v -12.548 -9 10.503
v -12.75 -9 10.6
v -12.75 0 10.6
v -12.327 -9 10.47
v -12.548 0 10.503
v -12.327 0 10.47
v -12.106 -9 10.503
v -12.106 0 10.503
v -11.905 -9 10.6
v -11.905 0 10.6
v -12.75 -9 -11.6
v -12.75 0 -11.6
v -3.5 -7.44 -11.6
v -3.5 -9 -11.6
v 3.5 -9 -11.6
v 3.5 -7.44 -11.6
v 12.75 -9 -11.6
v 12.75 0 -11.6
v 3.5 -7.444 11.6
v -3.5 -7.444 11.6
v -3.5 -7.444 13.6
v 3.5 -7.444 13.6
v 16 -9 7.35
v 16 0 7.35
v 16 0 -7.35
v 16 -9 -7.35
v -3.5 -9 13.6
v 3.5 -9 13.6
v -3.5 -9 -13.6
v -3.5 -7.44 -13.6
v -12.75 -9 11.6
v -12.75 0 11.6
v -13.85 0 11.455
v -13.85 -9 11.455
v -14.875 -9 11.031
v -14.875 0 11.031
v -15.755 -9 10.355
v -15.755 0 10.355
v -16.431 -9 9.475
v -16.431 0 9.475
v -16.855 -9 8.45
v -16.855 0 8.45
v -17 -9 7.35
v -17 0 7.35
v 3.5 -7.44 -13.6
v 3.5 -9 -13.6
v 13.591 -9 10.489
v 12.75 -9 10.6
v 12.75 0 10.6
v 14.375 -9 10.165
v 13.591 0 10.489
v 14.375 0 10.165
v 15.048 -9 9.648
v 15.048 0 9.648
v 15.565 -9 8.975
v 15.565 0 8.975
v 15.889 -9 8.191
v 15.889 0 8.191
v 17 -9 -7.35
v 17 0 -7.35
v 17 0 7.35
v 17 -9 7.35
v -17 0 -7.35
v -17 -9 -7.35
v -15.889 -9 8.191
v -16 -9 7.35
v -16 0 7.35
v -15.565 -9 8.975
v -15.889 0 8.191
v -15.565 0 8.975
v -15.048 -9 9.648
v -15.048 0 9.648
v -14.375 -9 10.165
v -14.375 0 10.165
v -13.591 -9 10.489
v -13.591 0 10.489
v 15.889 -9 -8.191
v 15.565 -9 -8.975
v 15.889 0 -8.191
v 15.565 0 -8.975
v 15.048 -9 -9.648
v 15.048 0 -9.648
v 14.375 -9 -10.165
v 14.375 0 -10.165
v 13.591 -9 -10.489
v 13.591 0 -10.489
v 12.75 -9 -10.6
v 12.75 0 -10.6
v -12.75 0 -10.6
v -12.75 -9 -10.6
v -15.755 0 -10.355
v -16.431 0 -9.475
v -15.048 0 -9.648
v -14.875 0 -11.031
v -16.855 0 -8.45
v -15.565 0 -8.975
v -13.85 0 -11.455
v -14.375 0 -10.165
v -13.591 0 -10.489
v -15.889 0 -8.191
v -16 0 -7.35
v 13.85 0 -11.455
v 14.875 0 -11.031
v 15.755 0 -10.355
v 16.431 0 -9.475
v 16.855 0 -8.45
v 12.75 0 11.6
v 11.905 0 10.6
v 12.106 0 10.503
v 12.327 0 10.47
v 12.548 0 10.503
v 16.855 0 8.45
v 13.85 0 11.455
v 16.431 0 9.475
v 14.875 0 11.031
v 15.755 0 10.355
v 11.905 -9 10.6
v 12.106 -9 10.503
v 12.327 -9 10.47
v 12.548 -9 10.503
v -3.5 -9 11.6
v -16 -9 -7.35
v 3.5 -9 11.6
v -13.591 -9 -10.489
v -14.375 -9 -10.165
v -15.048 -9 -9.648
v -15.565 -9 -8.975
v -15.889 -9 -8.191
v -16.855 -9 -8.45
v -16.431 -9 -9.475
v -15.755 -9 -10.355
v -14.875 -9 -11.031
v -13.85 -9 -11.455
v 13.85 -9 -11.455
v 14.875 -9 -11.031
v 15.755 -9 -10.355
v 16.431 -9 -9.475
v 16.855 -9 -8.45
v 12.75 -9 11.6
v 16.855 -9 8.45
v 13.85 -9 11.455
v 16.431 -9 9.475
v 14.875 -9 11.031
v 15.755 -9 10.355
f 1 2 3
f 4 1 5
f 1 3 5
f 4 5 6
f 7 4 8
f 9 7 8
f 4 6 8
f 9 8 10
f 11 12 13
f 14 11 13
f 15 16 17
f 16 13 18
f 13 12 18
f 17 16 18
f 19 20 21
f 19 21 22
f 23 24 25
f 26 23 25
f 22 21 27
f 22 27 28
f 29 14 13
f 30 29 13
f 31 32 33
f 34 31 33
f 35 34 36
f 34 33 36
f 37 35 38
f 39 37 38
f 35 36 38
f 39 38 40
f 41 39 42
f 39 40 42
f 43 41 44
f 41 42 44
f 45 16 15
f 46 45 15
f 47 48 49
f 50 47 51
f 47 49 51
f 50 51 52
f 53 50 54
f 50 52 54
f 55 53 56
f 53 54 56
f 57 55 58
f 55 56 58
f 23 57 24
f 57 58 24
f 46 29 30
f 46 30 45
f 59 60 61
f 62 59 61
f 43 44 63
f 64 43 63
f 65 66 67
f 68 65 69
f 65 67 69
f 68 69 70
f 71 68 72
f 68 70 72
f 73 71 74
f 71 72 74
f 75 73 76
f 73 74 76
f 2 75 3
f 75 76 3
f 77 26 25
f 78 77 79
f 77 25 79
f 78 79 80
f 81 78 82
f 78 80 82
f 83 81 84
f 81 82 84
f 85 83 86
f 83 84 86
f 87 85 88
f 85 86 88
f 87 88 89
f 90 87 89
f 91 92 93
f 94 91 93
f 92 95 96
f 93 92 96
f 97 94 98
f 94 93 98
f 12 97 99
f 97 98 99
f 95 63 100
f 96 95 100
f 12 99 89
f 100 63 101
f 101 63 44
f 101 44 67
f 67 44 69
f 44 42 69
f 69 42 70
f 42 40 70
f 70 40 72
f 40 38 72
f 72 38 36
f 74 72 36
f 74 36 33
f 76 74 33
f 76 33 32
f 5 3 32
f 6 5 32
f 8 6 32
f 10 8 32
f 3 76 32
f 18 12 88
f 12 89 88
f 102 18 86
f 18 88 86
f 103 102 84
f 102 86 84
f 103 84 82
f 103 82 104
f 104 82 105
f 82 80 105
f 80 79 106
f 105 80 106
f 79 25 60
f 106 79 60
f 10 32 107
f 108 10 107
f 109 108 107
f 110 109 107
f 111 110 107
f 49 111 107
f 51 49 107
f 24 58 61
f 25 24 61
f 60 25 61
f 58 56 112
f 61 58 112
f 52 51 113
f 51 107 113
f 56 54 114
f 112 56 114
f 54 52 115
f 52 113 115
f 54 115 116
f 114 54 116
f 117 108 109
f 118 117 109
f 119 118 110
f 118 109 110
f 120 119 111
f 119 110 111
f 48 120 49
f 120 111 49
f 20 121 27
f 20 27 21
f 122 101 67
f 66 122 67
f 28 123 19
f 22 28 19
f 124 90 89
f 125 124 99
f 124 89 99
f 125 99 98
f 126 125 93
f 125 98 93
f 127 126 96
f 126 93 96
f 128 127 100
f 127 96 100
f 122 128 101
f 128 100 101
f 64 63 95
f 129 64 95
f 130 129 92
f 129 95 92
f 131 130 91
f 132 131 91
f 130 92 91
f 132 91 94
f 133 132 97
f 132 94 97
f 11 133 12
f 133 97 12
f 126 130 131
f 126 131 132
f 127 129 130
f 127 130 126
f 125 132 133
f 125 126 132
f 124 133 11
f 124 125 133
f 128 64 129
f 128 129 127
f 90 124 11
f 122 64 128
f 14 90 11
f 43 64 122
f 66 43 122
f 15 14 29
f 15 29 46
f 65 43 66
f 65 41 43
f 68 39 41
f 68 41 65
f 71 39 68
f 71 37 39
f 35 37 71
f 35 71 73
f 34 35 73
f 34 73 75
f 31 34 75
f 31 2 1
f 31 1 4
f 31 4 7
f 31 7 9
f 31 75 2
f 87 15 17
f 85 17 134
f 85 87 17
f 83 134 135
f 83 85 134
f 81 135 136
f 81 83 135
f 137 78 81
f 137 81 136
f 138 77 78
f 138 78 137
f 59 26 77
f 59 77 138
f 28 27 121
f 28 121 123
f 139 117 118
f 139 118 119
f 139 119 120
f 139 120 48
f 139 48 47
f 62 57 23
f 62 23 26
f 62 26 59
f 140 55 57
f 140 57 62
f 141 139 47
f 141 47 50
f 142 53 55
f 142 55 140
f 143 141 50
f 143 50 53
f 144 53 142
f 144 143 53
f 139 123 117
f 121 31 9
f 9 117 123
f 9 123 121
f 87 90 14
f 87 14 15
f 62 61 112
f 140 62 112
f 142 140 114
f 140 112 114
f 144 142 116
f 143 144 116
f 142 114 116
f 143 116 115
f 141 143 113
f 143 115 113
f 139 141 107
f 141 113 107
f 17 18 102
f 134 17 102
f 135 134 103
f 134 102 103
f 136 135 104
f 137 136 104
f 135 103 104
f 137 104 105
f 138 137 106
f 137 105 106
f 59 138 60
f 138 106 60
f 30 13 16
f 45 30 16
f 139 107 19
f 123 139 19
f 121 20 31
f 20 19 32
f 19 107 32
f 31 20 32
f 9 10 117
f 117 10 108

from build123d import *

# Parameters (mm, degrees)
F1_DEPTH = 9
F2_W     = 7
F2_H     = 1.55604
F3_DEPTH = 2
F5_DEPTH = 9
F6_DEPTH = 9
F8_DEPTH = 2


with BuildPart() as f1:
    # F0 (on Front) → F1 (new body)
    with BuildSketch(Plane.XZ):
        with BuildLine():
            Line((17, -7.35), (17, 7.35))
            ThreePointArc((17, 7.35), (15.755204, 10.355204), (12.75, 11.6))
            Line((12.75, 11.6), (-12.75, 11.6))
            ThreePointArc((-12.75, 11.6), (-15.755204, 10.355204), (-17, 7.35))
            Line((-17, 7.35), (-17, -7.35))
            ThreePointArc((-17, -7.35), (-15.755204, -10.355204), (-12.75, -11.6))
            Line((-12.75, -11.6), (12.75, -11.6))
            ThreePointArc((12.75, -11.6), (15.755204, -10.355204), (17, -7.35))
        make_face()
        with BuildLine():
            ThreePointArc((16, -7.35), (15.048097, -9.648097), (12.75, -10.6))
            Line((12.75, -10.6), (-12.75, -10.6))
            ThreePointArc((-12.75, -10.6), (-15.048097, -9.648097), (-16, -7.35))
            Line((-16, -7.35), (-16, 7.35))
            ThreePointArc((-16, 7.35), (-15.048097, 9.648097), (-12.75, 10.6))
            Line((-12.75, 10.6), (12.75, 10.6))
            ThreePointArc((12.75, 10.6), (15.048097, 9.648097), (16, 7.35))
            Line((16, 7.35), (16, -7.35))
        make_face(mode=Mode.SUBTRACT)
    extrude(amount=F1_DEPTH)

    # F2 (on face) → F3 (join)
    with BuildSketch(Plane.XY.offset(11.6)):
        with Locations((0, -8.22198)):
            Rectangle(F2_W, F2_H)
    extrude(amount=F3_DEPTH)

    # F4 (on Front) → F5 (join)
    with BuildSketch(Plane.XZ):
        with BuildLine():
            Line((-11.904627, 10.6), (-12.75, 10.6))
            ThreePointArc((-12.75, 10.6), (-12.327314, 10.469545), (-11.904627, 10.6))
        make_face()
        with BuildLine():
            ThreePointArc((11.904627, 10.6), (12.327314, 10.469545), (12.75, 10.6))
            Line((12.75, 10.6), (11.904627, 10.6))
        make_face()
    extrude(amount=F5_DEPTH)

    # F4 (on Front) → F6 (join)
    with BuildSketch(Plane.XZ):
        with BuildLine():
            Line((-11.904627, 10.6), (-12.75, 10.6))
            ThreePointArc((-12.75, 10.6), (-12.327314, 10.469545), (-11.904627, 10.6))
        make_face()
        with BuildLine():
            ThreePointArc((11.904627, 10.6), (12.327314, 10.469545), (12.75, 10.6))
            Line((12.75, 10.6), (11.904627, 10.6))
        make_face()
    extrude(amount=F6_DEPTH)

    # F7 (on face) → F8 (join)
    with BuildSketch(Plane(origin=(0, 0, -11.6), x_dir=(1, 0, 0), z_dir=(0, 0, -1))):
        Polygon((3.5, 9), (0, 9), (-3.5, 9), (-3.5, 7.44), (0, 7.44), (3.5, 7.44), align=None)
    extrude(amount=F8_DEPTH)


solid = f1.part
